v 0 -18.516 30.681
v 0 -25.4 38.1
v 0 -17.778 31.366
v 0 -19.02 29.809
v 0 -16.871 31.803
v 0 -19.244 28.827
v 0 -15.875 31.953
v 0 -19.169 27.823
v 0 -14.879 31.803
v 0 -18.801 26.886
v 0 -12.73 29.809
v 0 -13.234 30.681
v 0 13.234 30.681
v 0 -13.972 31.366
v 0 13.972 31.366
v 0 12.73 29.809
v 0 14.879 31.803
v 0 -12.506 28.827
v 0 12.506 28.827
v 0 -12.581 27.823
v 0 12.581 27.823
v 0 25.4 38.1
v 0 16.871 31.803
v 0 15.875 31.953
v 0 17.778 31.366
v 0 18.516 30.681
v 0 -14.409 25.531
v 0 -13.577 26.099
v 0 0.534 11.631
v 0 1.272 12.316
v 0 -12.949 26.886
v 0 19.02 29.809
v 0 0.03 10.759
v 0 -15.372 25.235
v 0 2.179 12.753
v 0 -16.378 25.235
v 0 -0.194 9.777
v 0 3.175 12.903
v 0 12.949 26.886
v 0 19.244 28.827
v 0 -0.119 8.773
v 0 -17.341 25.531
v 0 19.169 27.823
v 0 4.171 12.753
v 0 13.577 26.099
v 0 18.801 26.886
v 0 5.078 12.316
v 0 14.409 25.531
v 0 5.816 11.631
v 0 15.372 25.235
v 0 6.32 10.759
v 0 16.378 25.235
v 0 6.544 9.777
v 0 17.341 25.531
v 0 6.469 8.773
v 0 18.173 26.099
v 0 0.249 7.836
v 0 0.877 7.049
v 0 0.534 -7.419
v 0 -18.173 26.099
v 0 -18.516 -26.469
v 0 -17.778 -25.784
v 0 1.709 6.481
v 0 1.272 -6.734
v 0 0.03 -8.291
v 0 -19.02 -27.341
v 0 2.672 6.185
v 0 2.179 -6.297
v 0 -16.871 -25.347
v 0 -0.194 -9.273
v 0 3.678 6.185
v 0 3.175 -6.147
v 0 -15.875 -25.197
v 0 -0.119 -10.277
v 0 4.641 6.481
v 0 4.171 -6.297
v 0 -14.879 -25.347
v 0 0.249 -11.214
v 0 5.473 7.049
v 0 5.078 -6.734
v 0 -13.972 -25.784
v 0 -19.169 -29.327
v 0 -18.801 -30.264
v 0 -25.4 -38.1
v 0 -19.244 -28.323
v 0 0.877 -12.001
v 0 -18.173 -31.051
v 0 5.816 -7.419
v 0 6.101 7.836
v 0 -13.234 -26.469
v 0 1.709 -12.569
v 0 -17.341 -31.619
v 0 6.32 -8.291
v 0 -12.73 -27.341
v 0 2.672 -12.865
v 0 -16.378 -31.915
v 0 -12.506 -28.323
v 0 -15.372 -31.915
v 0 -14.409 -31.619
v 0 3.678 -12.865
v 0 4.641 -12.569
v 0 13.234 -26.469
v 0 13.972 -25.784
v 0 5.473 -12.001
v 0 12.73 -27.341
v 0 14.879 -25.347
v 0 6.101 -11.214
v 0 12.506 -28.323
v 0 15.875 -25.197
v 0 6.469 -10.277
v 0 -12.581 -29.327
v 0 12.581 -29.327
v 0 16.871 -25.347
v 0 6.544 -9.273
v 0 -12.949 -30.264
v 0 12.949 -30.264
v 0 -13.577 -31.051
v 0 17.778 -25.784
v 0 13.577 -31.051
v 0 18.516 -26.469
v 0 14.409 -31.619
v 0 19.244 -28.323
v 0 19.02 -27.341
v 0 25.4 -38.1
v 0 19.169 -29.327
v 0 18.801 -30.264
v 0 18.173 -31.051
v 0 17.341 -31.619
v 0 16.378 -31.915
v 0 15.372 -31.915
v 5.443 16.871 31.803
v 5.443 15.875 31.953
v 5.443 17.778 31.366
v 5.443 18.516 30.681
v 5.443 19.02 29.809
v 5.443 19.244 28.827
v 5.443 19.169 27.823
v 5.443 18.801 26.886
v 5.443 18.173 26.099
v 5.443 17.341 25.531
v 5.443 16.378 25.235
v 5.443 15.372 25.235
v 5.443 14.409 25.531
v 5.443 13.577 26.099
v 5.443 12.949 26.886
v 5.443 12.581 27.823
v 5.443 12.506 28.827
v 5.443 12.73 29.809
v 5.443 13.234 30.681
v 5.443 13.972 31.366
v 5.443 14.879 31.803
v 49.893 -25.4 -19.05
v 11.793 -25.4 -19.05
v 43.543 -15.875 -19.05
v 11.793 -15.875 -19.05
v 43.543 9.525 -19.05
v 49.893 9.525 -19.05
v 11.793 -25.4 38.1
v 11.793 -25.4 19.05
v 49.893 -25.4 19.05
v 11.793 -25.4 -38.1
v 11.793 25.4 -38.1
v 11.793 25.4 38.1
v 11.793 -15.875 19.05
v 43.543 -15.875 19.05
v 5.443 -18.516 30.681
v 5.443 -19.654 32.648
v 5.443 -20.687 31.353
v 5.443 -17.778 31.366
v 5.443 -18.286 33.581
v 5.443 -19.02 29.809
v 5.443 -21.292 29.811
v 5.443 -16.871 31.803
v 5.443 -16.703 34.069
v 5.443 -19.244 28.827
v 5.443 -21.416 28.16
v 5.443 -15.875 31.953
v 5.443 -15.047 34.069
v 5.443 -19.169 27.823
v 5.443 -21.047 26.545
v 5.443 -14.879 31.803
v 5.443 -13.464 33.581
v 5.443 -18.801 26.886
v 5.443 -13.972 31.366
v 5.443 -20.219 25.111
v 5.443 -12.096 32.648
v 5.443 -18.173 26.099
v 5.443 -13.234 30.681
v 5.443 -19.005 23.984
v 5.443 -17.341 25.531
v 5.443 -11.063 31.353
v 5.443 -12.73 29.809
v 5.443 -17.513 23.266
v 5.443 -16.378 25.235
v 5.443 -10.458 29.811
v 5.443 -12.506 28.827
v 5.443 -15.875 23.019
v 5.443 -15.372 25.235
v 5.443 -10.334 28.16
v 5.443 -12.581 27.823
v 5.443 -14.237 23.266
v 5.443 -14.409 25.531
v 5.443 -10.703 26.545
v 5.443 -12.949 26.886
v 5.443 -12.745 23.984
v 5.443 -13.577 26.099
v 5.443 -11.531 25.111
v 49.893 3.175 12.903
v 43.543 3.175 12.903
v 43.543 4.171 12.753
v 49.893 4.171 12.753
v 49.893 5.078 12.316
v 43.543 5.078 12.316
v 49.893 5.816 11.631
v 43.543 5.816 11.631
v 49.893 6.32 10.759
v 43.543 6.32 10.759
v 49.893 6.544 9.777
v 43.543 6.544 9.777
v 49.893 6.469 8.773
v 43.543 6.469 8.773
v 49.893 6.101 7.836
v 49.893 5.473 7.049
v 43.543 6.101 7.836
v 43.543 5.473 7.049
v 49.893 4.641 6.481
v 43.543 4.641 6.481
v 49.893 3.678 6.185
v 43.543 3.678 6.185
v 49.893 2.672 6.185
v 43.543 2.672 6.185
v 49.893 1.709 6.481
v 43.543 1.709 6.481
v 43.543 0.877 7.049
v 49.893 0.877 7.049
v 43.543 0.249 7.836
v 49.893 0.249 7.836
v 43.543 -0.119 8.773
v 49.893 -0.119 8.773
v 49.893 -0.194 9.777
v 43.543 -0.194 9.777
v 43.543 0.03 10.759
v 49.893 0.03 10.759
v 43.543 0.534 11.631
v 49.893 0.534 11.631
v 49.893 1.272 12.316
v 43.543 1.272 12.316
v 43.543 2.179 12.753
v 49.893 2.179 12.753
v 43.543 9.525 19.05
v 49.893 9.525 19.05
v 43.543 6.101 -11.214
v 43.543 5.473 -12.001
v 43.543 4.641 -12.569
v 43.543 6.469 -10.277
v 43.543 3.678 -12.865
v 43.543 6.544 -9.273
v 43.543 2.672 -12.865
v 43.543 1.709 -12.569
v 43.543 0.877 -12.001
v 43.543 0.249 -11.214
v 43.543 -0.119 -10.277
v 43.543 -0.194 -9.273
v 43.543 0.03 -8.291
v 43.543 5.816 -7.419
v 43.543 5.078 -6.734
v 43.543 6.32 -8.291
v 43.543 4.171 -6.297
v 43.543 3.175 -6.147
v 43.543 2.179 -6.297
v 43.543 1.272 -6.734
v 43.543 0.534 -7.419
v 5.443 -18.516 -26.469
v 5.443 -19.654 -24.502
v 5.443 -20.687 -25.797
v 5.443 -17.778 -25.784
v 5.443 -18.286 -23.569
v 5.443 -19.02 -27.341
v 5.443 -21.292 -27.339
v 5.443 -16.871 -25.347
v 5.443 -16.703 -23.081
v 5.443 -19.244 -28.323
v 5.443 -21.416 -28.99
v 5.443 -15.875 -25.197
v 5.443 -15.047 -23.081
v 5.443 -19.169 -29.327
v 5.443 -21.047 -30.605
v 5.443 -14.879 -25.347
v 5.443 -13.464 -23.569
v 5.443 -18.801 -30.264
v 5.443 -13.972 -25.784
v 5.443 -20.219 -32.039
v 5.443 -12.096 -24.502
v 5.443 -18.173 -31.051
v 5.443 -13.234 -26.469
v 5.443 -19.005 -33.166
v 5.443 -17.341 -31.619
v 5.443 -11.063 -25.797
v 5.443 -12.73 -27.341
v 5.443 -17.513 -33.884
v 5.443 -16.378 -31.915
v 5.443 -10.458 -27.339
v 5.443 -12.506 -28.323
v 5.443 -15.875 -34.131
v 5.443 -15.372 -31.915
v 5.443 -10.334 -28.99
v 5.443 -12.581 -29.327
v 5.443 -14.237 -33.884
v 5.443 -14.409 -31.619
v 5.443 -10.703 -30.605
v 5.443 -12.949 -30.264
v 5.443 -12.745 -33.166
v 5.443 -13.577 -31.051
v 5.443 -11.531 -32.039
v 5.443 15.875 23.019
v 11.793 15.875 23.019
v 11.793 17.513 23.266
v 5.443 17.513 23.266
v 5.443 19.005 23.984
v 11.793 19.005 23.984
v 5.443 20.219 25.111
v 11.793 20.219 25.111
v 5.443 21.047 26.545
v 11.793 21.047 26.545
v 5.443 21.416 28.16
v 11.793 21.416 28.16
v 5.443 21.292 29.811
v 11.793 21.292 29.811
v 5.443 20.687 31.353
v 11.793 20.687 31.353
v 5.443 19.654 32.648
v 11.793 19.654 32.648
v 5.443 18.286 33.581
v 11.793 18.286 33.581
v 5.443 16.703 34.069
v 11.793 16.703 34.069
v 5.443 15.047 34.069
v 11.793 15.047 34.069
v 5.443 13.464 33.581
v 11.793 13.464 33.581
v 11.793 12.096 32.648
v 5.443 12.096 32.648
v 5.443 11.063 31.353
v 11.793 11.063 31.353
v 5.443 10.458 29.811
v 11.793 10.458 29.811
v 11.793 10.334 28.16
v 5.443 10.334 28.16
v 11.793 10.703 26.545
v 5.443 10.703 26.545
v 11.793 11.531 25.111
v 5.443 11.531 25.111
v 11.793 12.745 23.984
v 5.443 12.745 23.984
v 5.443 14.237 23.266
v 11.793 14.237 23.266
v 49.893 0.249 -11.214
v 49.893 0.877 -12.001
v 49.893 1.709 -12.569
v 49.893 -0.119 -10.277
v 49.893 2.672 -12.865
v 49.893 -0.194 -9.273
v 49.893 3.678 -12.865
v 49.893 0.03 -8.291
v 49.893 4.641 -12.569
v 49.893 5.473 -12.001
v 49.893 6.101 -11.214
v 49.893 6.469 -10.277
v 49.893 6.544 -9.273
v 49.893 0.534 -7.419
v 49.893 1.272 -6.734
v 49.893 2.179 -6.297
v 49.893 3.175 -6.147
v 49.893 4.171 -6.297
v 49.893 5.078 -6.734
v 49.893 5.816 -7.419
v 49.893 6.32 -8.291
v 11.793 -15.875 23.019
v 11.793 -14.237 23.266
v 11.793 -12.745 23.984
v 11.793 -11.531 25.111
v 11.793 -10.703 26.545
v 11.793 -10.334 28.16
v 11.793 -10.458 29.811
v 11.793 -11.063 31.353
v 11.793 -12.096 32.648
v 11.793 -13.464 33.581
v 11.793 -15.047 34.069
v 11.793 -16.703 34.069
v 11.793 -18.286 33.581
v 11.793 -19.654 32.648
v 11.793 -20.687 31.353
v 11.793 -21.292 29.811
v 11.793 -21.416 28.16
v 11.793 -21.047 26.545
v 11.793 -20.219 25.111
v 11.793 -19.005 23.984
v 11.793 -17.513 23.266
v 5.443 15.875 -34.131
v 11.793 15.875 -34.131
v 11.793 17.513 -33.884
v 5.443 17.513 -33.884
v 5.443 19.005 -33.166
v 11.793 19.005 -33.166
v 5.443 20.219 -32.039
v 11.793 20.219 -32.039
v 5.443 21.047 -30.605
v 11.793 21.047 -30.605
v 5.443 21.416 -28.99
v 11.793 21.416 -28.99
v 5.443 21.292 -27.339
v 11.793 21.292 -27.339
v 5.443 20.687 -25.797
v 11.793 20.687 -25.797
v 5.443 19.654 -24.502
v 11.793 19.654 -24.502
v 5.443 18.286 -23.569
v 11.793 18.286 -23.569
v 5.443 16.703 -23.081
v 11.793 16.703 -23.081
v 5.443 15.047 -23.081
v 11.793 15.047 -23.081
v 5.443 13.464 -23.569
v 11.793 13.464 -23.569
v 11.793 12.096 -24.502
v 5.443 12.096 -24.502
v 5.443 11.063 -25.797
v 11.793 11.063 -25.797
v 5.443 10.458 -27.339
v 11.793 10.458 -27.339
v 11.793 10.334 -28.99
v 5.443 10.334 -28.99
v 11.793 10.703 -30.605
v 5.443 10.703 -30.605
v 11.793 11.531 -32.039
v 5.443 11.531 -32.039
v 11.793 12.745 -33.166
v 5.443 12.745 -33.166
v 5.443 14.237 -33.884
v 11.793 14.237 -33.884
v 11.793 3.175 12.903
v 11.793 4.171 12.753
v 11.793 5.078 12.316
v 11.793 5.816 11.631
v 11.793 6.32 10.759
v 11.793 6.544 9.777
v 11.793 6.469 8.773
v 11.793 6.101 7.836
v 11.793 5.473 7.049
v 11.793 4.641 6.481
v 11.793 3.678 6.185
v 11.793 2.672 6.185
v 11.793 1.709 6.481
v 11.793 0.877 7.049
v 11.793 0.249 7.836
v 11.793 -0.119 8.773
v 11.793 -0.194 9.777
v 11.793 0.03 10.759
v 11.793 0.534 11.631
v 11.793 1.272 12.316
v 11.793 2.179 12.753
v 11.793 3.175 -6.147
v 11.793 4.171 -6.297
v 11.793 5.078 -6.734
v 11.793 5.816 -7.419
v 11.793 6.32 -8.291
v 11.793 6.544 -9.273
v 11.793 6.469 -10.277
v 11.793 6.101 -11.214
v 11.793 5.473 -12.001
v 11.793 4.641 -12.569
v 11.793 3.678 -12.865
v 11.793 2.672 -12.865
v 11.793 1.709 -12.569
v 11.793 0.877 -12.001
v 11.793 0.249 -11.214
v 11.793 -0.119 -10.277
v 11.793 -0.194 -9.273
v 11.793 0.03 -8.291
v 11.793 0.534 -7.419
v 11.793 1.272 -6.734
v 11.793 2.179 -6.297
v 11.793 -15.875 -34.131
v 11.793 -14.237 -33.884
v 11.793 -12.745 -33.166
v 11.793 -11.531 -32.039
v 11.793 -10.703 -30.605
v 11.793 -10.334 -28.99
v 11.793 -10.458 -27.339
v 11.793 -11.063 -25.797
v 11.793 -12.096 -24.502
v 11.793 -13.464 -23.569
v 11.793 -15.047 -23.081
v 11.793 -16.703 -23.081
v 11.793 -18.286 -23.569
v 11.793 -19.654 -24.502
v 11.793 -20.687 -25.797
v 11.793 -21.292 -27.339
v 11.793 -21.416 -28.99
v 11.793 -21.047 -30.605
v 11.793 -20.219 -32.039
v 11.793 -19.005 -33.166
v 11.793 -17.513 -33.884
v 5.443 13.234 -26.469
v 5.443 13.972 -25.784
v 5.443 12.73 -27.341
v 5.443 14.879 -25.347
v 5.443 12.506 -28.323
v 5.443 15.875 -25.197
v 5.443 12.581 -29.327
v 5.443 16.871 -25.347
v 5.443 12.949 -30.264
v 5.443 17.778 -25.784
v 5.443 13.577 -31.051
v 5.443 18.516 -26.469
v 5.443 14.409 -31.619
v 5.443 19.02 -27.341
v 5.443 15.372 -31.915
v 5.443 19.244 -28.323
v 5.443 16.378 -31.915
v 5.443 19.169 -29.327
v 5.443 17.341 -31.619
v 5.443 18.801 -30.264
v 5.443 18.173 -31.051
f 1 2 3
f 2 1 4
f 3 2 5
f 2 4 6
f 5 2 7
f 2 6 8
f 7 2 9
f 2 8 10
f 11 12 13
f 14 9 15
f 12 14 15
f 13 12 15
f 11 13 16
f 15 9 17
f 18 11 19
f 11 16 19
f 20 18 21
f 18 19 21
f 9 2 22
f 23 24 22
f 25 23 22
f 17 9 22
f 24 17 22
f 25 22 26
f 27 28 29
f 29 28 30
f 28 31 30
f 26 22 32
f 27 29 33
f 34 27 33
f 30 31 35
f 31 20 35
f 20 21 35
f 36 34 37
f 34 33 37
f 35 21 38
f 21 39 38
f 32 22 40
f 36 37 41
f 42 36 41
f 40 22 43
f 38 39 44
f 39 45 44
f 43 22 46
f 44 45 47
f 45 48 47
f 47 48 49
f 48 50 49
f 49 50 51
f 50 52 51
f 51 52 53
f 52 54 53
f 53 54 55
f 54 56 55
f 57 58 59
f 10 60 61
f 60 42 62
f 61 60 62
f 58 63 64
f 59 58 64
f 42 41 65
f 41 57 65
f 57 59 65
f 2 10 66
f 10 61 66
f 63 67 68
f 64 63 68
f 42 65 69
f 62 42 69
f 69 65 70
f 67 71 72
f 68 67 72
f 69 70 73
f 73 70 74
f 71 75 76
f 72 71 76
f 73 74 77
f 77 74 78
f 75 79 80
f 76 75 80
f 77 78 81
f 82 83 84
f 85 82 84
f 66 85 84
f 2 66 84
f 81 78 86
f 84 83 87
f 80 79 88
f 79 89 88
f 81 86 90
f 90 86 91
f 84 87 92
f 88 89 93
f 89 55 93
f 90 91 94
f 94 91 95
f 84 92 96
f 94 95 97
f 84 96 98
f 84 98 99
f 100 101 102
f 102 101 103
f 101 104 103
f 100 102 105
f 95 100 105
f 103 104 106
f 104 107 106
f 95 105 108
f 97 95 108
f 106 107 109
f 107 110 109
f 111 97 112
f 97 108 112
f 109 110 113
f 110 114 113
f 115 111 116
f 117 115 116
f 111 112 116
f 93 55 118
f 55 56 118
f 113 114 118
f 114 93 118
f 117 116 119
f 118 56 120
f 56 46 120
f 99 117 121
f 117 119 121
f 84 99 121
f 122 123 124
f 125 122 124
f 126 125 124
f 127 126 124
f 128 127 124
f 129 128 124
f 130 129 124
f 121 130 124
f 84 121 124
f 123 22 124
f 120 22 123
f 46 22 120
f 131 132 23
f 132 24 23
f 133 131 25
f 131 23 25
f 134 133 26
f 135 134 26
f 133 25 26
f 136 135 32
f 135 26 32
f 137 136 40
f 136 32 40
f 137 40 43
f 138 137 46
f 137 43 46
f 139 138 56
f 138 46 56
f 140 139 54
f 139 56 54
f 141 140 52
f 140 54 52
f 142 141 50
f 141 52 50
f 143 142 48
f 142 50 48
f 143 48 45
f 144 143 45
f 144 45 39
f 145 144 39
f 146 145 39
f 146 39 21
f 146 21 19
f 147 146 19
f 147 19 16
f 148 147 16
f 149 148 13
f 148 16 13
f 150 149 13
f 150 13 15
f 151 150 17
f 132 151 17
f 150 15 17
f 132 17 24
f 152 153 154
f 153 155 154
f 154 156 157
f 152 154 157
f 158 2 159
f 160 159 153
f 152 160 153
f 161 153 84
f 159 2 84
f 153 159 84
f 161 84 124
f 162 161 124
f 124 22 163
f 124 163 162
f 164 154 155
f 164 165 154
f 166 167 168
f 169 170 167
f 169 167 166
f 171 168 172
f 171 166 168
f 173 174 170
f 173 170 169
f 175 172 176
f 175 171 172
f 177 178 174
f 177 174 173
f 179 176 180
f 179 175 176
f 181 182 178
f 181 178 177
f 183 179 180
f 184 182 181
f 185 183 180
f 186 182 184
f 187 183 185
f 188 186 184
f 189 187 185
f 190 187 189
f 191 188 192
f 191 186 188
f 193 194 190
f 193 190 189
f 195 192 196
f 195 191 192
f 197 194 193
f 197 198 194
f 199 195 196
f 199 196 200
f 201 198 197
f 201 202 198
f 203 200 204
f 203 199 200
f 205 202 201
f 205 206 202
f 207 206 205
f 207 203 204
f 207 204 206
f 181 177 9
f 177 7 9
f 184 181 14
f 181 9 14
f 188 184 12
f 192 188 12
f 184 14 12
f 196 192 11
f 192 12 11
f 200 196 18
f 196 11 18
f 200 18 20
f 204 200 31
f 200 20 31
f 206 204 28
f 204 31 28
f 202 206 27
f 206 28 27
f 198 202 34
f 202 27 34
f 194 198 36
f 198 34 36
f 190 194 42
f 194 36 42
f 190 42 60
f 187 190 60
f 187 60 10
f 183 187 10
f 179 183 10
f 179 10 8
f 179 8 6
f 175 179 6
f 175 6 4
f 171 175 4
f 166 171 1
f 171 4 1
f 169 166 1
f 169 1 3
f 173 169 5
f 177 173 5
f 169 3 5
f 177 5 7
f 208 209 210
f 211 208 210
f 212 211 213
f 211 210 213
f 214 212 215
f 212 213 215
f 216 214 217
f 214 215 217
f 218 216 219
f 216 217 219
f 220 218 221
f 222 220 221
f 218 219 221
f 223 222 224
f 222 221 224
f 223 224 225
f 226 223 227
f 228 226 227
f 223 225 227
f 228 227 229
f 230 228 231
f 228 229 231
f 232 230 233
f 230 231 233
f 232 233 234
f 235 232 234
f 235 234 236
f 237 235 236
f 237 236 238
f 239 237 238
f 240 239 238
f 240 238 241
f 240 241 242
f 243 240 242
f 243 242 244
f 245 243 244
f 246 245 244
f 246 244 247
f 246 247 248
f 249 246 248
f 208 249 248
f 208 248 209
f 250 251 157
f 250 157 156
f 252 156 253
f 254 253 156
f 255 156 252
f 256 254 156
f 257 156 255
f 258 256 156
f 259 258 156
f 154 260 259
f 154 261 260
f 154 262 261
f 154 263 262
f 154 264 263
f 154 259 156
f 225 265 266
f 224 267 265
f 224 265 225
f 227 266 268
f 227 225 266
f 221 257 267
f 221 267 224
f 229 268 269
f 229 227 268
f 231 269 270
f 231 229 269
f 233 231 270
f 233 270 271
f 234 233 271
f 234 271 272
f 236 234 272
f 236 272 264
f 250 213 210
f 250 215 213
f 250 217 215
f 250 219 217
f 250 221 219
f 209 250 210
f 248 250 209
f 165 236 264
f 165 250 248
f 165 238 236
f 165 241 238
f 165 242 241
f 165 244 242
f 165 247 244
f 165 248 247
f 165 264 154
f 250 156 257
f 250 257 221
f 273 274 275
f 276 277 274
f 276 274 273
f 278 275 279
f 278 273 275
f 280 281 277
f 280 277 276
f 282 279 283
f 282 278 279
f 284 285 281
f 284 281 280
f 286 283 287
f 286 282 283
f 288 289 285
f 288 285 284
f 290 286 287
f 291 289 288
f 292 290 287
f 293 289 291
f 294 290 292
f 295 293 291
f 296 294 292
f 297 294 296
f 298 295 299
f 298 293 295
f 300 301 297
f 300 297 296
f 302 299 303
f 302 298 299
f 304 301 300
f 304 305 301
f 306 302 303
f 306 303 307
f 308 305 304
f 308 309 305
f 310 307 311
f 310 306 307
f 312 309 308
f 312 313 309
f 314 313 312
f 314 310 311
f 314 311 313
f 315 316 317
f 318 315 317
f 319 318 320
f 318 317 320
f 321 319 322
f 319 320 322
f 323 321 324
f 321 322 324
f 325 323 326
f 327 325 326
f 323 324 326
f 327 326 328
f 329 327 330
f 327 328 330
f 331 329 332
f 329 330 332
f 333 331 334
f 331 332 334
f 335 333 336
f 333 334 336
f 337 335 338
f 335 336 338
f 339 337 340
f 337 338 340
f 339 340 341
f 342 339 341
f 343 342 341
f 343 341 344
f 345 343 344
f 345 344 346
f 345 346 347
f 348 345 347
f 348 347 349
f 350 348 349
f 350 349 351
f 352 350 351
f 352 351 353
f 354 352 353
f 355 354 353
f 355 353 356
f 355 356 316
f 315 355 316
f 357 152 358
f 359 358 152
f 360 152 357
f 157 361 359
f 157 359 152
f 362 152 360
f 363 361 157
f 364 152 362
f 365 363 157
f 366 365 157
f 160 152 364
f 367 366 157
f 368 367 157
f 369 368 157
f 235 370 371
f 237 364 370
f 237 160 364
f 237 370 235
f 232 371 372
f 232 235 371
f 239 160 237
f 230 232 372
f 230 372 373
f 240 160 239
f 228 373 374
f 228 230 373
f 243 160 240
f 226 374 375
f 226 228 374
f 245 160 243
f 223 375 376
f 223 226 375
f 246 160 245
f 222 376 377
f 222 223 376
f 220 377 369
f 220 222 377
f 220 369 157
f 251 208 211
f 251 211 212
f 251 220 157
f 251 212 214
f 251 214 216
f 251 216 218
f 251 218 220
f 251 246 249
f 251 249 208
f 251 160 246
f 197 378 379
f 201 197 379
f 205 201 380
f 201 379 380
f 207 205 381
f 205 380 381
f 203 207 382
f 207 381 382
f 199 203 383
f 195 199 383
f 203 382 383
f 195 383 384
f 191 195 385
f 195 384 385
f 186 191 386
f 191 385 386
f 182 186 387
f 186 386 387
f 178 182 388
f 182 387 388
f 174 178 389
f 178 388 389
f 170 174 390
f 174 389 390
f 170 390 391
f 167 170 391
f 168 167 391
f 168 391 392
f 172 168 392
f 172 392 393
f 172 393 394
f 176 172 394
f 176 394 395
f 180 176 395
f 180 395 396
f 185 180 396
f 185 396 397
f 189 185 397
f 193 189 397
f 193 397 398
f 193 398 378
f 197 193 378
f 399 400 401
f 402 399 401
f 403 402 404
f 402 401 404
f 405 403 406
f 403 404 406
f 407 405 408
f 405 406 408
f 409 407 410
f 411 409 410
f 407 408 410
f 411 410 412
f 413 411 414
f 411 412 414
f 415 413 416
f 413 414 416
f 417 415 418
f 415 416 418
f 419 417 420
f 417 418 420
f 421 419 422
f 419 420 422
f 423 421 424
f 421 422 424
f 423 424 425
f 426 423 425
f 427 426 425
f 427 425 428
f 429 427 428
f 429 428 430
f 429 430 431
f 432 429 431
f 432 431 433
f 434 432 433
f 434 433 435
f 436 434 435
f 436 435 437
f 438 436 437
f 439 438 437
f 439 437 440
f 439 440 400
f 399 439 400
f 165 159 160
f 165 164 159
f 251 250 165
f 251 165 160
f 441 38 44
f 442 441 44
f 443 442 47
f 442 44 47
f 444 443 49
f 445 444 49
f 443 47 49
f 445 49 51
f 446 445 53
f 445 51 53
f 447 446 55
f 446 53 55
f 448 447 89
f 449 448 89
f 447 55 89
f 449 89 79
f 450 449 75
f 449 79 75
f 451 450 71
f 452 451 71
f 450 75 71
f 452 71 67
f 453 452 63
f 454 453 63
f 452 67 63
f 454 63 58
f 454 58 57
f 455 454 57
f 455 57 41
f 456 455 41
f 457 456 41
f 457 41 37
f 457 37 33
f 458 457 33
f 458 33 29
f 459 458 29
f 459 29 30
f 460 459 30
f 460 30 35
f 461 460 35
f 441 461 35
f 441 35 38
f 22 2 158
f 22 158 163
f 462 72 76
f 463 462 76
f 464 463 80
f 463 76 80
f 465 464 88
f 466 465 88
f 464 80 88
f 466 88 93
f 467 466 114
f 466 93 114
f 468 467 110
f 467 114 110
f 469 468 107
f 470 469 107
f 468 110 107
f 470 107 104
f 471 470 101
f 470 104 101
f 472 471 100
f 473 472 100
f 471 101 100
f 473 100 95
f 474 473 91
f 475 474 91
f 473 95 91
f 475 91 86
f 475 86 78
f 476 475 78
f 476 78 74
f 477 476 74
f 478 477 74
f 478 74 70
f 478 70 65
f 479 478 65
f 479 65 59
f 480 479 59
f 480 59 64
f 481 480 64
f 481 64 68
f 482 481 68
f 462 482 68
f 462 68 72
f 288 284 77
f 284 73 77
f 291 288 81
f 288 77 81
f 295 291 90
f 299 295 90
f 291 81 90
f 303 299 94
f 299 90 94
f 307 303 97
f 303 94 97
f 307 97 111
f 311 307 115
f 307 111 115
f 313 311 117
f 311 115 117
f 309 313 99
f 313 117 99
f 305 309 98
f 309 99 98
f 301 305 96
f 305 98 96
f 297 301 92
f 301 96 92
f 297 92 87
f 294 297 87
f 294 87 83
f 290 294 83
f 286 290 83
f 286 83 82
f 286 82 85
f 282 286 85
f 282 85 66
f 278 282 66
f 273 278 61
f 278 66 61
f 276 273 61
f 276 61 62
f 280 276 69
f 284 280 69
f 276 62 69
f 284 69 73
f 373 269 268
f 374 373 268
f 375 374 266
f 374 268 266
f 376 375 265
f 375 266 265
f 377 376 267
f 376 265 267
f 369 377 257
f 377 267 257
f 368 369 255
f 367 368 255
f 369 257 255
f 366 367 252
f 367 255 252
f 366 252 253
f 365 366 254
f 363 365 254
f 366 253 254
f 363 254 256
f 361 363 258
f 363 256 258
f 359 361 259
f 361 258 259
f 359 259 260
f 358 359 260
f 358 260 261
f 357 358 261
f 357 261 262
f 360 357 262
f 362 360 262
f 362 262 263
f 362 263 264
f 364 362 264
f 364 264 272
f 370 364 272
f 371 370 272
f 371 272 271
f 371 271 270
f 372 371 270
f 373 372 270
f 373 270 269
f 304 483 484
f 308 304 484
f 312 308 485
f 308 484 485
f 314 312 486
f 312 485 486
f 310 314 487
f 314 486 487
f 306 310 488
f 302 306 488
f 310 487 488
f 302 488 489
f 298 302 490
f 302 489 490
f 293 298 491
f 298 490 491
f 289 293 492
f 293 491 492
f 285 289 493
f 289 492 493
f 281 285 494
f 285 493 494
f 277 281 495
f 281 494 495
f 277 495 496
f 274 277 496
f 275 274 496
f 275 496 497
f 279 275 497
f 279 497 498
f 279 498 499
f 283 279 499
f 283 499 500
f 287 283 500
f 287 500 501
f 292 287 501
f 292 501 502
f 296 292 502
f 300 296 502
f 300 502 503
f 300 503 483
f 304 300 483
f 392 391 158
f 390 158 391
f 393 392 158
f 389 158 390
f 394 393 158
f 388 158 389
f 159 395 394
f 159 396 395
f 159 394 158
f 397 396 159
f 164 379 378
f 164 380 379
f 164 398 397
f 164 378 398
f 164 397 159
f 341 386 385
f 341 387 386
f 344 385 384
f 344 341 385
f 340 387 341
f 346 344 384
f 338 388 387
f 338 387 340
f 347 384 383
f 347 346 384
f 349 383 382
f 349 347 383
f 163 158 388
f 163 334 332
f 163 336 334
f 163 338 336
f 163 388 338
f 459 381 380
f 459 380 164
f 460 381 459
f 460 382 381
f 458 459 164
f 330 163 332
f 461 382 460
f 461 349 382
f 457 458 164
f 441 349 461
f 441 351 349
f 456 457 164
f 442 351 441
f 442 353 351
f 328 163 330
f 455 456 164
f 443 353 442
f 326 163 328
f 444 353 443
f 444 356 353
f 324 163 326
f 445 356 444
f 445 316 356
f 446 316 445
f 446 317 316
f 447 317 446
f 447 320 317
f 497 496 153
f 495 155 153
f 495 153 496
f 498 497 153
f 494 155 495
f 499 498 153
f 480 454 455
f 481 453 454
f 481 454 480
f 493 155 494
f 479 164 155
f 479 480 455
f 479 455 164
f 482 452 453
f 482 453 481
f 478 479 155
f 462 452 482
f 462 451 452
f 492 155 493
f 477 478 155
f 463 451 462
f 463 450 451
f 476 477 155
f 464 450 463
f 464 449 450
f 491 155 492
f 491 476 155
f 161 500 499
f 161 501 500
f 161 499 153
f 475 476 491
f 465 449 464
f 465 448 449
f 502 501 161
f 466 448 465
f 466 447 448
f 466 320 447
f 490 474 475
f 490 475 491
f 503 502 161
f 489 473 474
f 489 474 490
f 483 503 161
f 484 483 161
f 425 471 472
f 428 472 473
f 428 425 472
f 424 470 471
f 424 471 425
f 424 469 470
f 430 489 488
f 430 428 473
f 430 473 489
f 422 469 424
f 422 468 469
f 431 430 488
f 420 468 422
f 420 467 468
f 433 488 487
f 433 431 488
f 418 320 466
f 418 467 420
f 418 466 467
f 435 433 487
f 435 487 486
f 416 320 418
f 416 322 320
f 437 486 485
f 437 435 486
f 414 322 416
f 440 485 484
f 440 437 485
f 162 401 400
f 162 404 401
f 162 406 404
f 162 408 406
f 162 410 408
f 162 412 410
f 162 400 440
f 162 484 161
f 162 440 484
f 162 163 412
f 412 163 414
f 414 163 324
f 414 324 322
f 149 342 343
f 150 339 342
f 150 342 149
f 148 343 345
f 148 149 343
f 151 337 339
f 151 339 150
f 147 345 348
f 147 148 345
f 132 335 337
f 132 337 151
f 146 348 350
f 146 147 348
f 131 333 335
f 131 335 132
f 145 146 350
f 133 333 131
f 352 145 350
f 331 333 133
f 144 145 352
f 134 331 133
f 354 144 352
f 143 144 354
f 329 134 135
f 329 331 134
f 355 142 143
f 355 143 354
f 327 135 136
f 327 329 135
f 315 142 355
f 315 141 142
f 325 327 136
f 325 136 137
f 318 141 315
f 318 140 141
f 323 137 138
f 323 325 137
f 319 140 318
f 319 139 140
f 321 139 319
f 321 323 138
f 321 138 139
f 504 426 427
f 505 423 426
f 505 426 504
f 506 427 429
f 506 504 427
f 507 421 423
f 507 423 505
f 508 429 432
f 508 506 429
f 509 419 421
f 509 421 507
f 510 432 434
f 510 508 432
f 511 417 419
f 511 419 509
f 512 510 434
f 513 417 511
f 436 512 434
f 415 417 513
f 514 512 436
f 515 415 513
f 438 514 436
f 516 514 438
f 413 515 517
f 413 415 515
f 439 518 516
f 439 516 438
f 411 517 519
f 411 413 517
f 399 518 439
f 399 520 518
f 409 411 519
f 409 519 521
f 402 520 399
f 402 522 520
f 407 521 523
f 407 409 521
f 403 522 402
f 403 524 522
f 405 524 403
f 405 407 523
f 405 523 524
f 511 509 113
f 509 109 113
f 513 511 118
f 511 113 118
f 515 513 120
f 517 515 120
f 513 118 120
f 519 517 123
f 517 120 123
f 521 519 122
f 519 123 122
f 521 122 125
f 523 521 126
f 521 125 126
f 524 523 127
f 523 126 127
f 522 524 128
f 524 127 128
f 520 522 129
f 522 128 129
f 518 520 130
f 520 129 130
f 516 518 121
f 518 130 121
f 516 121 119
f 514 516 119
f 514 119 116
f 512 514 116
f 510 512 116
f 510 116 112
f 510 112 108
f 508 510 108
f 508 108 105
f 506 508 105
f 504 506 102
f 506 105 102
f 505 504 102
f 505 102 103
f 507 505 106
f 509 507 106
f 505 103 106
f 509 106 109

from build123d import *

# Parameters (mm, degrees)
SKETCH1_W                                        = 76.2
SKETCH1_H                                        = 50.8
BOSS_EXTRUDE1_DEPTH                              = 11.79269038
BOSS_EXTRUDE2_START                              = -38.1
BOSS_EXTRUDE2_DEPTH                              = 19.05
F_1_4_CLEARANCE_HOLE2_D                          = 6.7564
CBORE_FOR_1_4_SOCKET_HEAD_CAP_SCREW1_D           = 6.7564
CBORE_FOR_1_4_SOCKET_HEAD_CAP_SCREW1_CBORE_D     = 11.1125
CBORE_FOR_1_4_SOCKET_HEAD_CAP_SCREW1_CBORE_DEPTH = 6.35


with BuildPart() as part:
    # Sketch1 → Boss-Extrude1 (new body)
    with BuildSketch(Plane(origin=(0, 0, 0), x_dir=(0, 0, -1), z_dir=(1, 0, 0))):
        Rectangle(SKETCH1_W, SKETCH1_H)
    extrude(amount=BOSS_EXTRUDE1_DEPTH)

    # Sketch7 → Boss-Extrude2 (add, symmetric)
    with BuildSketch(Plane.XY.offset(38.1).offset(BOSS_EXTRUDE2_START)):
        Polygon((11.79269038, -25.4), (49.89269038, -25.4), (49.89269038, 9.525), (43.54269038, 9.525), (43.54269038, -15.875), (11.79269038, -15.875), align=None)
    extrude(amount=BOSS_EXTRUDE2_DEPTH, both=True)

    # 1/4 Clearance Hole2 (through all)
    with Locations(Plane(origin=(49.89269038, 0, 0), x_dir=(0, 0, -1), z_dir=(1, 0, 0))):
        with Locations((-9.525, 3.175), (9.525, 3.175)):
            Hole(F_1_4_CLEARANCE_HOLE2_D / 2)

    # CBORE for 1/4 Socket Head Cap Screw1 (through all)
    with Locations(Plane(origin=(11.79269038, 0, 0), x_dir=(0, 0, -1), z_dir=(1, 0, 0))):
        with Locations((-28.575, 15.875), (28.575, 15.875), (28.575, -15.875), (-28.575, -15.875)):
            CounterBoreHole(CBORE_FOR_1_4_SOCKET_HEAD_CAP_SCREW1_D / 2, CBORE_FOR_1_4_SOCKET_HEAD_CAP_SCREW1_CBORE_D / 2, CBORE_FOR_1_4_SOCKET_HEAD_CAP_SCREW1_CBORE_DEPTH)


solid = part.part
